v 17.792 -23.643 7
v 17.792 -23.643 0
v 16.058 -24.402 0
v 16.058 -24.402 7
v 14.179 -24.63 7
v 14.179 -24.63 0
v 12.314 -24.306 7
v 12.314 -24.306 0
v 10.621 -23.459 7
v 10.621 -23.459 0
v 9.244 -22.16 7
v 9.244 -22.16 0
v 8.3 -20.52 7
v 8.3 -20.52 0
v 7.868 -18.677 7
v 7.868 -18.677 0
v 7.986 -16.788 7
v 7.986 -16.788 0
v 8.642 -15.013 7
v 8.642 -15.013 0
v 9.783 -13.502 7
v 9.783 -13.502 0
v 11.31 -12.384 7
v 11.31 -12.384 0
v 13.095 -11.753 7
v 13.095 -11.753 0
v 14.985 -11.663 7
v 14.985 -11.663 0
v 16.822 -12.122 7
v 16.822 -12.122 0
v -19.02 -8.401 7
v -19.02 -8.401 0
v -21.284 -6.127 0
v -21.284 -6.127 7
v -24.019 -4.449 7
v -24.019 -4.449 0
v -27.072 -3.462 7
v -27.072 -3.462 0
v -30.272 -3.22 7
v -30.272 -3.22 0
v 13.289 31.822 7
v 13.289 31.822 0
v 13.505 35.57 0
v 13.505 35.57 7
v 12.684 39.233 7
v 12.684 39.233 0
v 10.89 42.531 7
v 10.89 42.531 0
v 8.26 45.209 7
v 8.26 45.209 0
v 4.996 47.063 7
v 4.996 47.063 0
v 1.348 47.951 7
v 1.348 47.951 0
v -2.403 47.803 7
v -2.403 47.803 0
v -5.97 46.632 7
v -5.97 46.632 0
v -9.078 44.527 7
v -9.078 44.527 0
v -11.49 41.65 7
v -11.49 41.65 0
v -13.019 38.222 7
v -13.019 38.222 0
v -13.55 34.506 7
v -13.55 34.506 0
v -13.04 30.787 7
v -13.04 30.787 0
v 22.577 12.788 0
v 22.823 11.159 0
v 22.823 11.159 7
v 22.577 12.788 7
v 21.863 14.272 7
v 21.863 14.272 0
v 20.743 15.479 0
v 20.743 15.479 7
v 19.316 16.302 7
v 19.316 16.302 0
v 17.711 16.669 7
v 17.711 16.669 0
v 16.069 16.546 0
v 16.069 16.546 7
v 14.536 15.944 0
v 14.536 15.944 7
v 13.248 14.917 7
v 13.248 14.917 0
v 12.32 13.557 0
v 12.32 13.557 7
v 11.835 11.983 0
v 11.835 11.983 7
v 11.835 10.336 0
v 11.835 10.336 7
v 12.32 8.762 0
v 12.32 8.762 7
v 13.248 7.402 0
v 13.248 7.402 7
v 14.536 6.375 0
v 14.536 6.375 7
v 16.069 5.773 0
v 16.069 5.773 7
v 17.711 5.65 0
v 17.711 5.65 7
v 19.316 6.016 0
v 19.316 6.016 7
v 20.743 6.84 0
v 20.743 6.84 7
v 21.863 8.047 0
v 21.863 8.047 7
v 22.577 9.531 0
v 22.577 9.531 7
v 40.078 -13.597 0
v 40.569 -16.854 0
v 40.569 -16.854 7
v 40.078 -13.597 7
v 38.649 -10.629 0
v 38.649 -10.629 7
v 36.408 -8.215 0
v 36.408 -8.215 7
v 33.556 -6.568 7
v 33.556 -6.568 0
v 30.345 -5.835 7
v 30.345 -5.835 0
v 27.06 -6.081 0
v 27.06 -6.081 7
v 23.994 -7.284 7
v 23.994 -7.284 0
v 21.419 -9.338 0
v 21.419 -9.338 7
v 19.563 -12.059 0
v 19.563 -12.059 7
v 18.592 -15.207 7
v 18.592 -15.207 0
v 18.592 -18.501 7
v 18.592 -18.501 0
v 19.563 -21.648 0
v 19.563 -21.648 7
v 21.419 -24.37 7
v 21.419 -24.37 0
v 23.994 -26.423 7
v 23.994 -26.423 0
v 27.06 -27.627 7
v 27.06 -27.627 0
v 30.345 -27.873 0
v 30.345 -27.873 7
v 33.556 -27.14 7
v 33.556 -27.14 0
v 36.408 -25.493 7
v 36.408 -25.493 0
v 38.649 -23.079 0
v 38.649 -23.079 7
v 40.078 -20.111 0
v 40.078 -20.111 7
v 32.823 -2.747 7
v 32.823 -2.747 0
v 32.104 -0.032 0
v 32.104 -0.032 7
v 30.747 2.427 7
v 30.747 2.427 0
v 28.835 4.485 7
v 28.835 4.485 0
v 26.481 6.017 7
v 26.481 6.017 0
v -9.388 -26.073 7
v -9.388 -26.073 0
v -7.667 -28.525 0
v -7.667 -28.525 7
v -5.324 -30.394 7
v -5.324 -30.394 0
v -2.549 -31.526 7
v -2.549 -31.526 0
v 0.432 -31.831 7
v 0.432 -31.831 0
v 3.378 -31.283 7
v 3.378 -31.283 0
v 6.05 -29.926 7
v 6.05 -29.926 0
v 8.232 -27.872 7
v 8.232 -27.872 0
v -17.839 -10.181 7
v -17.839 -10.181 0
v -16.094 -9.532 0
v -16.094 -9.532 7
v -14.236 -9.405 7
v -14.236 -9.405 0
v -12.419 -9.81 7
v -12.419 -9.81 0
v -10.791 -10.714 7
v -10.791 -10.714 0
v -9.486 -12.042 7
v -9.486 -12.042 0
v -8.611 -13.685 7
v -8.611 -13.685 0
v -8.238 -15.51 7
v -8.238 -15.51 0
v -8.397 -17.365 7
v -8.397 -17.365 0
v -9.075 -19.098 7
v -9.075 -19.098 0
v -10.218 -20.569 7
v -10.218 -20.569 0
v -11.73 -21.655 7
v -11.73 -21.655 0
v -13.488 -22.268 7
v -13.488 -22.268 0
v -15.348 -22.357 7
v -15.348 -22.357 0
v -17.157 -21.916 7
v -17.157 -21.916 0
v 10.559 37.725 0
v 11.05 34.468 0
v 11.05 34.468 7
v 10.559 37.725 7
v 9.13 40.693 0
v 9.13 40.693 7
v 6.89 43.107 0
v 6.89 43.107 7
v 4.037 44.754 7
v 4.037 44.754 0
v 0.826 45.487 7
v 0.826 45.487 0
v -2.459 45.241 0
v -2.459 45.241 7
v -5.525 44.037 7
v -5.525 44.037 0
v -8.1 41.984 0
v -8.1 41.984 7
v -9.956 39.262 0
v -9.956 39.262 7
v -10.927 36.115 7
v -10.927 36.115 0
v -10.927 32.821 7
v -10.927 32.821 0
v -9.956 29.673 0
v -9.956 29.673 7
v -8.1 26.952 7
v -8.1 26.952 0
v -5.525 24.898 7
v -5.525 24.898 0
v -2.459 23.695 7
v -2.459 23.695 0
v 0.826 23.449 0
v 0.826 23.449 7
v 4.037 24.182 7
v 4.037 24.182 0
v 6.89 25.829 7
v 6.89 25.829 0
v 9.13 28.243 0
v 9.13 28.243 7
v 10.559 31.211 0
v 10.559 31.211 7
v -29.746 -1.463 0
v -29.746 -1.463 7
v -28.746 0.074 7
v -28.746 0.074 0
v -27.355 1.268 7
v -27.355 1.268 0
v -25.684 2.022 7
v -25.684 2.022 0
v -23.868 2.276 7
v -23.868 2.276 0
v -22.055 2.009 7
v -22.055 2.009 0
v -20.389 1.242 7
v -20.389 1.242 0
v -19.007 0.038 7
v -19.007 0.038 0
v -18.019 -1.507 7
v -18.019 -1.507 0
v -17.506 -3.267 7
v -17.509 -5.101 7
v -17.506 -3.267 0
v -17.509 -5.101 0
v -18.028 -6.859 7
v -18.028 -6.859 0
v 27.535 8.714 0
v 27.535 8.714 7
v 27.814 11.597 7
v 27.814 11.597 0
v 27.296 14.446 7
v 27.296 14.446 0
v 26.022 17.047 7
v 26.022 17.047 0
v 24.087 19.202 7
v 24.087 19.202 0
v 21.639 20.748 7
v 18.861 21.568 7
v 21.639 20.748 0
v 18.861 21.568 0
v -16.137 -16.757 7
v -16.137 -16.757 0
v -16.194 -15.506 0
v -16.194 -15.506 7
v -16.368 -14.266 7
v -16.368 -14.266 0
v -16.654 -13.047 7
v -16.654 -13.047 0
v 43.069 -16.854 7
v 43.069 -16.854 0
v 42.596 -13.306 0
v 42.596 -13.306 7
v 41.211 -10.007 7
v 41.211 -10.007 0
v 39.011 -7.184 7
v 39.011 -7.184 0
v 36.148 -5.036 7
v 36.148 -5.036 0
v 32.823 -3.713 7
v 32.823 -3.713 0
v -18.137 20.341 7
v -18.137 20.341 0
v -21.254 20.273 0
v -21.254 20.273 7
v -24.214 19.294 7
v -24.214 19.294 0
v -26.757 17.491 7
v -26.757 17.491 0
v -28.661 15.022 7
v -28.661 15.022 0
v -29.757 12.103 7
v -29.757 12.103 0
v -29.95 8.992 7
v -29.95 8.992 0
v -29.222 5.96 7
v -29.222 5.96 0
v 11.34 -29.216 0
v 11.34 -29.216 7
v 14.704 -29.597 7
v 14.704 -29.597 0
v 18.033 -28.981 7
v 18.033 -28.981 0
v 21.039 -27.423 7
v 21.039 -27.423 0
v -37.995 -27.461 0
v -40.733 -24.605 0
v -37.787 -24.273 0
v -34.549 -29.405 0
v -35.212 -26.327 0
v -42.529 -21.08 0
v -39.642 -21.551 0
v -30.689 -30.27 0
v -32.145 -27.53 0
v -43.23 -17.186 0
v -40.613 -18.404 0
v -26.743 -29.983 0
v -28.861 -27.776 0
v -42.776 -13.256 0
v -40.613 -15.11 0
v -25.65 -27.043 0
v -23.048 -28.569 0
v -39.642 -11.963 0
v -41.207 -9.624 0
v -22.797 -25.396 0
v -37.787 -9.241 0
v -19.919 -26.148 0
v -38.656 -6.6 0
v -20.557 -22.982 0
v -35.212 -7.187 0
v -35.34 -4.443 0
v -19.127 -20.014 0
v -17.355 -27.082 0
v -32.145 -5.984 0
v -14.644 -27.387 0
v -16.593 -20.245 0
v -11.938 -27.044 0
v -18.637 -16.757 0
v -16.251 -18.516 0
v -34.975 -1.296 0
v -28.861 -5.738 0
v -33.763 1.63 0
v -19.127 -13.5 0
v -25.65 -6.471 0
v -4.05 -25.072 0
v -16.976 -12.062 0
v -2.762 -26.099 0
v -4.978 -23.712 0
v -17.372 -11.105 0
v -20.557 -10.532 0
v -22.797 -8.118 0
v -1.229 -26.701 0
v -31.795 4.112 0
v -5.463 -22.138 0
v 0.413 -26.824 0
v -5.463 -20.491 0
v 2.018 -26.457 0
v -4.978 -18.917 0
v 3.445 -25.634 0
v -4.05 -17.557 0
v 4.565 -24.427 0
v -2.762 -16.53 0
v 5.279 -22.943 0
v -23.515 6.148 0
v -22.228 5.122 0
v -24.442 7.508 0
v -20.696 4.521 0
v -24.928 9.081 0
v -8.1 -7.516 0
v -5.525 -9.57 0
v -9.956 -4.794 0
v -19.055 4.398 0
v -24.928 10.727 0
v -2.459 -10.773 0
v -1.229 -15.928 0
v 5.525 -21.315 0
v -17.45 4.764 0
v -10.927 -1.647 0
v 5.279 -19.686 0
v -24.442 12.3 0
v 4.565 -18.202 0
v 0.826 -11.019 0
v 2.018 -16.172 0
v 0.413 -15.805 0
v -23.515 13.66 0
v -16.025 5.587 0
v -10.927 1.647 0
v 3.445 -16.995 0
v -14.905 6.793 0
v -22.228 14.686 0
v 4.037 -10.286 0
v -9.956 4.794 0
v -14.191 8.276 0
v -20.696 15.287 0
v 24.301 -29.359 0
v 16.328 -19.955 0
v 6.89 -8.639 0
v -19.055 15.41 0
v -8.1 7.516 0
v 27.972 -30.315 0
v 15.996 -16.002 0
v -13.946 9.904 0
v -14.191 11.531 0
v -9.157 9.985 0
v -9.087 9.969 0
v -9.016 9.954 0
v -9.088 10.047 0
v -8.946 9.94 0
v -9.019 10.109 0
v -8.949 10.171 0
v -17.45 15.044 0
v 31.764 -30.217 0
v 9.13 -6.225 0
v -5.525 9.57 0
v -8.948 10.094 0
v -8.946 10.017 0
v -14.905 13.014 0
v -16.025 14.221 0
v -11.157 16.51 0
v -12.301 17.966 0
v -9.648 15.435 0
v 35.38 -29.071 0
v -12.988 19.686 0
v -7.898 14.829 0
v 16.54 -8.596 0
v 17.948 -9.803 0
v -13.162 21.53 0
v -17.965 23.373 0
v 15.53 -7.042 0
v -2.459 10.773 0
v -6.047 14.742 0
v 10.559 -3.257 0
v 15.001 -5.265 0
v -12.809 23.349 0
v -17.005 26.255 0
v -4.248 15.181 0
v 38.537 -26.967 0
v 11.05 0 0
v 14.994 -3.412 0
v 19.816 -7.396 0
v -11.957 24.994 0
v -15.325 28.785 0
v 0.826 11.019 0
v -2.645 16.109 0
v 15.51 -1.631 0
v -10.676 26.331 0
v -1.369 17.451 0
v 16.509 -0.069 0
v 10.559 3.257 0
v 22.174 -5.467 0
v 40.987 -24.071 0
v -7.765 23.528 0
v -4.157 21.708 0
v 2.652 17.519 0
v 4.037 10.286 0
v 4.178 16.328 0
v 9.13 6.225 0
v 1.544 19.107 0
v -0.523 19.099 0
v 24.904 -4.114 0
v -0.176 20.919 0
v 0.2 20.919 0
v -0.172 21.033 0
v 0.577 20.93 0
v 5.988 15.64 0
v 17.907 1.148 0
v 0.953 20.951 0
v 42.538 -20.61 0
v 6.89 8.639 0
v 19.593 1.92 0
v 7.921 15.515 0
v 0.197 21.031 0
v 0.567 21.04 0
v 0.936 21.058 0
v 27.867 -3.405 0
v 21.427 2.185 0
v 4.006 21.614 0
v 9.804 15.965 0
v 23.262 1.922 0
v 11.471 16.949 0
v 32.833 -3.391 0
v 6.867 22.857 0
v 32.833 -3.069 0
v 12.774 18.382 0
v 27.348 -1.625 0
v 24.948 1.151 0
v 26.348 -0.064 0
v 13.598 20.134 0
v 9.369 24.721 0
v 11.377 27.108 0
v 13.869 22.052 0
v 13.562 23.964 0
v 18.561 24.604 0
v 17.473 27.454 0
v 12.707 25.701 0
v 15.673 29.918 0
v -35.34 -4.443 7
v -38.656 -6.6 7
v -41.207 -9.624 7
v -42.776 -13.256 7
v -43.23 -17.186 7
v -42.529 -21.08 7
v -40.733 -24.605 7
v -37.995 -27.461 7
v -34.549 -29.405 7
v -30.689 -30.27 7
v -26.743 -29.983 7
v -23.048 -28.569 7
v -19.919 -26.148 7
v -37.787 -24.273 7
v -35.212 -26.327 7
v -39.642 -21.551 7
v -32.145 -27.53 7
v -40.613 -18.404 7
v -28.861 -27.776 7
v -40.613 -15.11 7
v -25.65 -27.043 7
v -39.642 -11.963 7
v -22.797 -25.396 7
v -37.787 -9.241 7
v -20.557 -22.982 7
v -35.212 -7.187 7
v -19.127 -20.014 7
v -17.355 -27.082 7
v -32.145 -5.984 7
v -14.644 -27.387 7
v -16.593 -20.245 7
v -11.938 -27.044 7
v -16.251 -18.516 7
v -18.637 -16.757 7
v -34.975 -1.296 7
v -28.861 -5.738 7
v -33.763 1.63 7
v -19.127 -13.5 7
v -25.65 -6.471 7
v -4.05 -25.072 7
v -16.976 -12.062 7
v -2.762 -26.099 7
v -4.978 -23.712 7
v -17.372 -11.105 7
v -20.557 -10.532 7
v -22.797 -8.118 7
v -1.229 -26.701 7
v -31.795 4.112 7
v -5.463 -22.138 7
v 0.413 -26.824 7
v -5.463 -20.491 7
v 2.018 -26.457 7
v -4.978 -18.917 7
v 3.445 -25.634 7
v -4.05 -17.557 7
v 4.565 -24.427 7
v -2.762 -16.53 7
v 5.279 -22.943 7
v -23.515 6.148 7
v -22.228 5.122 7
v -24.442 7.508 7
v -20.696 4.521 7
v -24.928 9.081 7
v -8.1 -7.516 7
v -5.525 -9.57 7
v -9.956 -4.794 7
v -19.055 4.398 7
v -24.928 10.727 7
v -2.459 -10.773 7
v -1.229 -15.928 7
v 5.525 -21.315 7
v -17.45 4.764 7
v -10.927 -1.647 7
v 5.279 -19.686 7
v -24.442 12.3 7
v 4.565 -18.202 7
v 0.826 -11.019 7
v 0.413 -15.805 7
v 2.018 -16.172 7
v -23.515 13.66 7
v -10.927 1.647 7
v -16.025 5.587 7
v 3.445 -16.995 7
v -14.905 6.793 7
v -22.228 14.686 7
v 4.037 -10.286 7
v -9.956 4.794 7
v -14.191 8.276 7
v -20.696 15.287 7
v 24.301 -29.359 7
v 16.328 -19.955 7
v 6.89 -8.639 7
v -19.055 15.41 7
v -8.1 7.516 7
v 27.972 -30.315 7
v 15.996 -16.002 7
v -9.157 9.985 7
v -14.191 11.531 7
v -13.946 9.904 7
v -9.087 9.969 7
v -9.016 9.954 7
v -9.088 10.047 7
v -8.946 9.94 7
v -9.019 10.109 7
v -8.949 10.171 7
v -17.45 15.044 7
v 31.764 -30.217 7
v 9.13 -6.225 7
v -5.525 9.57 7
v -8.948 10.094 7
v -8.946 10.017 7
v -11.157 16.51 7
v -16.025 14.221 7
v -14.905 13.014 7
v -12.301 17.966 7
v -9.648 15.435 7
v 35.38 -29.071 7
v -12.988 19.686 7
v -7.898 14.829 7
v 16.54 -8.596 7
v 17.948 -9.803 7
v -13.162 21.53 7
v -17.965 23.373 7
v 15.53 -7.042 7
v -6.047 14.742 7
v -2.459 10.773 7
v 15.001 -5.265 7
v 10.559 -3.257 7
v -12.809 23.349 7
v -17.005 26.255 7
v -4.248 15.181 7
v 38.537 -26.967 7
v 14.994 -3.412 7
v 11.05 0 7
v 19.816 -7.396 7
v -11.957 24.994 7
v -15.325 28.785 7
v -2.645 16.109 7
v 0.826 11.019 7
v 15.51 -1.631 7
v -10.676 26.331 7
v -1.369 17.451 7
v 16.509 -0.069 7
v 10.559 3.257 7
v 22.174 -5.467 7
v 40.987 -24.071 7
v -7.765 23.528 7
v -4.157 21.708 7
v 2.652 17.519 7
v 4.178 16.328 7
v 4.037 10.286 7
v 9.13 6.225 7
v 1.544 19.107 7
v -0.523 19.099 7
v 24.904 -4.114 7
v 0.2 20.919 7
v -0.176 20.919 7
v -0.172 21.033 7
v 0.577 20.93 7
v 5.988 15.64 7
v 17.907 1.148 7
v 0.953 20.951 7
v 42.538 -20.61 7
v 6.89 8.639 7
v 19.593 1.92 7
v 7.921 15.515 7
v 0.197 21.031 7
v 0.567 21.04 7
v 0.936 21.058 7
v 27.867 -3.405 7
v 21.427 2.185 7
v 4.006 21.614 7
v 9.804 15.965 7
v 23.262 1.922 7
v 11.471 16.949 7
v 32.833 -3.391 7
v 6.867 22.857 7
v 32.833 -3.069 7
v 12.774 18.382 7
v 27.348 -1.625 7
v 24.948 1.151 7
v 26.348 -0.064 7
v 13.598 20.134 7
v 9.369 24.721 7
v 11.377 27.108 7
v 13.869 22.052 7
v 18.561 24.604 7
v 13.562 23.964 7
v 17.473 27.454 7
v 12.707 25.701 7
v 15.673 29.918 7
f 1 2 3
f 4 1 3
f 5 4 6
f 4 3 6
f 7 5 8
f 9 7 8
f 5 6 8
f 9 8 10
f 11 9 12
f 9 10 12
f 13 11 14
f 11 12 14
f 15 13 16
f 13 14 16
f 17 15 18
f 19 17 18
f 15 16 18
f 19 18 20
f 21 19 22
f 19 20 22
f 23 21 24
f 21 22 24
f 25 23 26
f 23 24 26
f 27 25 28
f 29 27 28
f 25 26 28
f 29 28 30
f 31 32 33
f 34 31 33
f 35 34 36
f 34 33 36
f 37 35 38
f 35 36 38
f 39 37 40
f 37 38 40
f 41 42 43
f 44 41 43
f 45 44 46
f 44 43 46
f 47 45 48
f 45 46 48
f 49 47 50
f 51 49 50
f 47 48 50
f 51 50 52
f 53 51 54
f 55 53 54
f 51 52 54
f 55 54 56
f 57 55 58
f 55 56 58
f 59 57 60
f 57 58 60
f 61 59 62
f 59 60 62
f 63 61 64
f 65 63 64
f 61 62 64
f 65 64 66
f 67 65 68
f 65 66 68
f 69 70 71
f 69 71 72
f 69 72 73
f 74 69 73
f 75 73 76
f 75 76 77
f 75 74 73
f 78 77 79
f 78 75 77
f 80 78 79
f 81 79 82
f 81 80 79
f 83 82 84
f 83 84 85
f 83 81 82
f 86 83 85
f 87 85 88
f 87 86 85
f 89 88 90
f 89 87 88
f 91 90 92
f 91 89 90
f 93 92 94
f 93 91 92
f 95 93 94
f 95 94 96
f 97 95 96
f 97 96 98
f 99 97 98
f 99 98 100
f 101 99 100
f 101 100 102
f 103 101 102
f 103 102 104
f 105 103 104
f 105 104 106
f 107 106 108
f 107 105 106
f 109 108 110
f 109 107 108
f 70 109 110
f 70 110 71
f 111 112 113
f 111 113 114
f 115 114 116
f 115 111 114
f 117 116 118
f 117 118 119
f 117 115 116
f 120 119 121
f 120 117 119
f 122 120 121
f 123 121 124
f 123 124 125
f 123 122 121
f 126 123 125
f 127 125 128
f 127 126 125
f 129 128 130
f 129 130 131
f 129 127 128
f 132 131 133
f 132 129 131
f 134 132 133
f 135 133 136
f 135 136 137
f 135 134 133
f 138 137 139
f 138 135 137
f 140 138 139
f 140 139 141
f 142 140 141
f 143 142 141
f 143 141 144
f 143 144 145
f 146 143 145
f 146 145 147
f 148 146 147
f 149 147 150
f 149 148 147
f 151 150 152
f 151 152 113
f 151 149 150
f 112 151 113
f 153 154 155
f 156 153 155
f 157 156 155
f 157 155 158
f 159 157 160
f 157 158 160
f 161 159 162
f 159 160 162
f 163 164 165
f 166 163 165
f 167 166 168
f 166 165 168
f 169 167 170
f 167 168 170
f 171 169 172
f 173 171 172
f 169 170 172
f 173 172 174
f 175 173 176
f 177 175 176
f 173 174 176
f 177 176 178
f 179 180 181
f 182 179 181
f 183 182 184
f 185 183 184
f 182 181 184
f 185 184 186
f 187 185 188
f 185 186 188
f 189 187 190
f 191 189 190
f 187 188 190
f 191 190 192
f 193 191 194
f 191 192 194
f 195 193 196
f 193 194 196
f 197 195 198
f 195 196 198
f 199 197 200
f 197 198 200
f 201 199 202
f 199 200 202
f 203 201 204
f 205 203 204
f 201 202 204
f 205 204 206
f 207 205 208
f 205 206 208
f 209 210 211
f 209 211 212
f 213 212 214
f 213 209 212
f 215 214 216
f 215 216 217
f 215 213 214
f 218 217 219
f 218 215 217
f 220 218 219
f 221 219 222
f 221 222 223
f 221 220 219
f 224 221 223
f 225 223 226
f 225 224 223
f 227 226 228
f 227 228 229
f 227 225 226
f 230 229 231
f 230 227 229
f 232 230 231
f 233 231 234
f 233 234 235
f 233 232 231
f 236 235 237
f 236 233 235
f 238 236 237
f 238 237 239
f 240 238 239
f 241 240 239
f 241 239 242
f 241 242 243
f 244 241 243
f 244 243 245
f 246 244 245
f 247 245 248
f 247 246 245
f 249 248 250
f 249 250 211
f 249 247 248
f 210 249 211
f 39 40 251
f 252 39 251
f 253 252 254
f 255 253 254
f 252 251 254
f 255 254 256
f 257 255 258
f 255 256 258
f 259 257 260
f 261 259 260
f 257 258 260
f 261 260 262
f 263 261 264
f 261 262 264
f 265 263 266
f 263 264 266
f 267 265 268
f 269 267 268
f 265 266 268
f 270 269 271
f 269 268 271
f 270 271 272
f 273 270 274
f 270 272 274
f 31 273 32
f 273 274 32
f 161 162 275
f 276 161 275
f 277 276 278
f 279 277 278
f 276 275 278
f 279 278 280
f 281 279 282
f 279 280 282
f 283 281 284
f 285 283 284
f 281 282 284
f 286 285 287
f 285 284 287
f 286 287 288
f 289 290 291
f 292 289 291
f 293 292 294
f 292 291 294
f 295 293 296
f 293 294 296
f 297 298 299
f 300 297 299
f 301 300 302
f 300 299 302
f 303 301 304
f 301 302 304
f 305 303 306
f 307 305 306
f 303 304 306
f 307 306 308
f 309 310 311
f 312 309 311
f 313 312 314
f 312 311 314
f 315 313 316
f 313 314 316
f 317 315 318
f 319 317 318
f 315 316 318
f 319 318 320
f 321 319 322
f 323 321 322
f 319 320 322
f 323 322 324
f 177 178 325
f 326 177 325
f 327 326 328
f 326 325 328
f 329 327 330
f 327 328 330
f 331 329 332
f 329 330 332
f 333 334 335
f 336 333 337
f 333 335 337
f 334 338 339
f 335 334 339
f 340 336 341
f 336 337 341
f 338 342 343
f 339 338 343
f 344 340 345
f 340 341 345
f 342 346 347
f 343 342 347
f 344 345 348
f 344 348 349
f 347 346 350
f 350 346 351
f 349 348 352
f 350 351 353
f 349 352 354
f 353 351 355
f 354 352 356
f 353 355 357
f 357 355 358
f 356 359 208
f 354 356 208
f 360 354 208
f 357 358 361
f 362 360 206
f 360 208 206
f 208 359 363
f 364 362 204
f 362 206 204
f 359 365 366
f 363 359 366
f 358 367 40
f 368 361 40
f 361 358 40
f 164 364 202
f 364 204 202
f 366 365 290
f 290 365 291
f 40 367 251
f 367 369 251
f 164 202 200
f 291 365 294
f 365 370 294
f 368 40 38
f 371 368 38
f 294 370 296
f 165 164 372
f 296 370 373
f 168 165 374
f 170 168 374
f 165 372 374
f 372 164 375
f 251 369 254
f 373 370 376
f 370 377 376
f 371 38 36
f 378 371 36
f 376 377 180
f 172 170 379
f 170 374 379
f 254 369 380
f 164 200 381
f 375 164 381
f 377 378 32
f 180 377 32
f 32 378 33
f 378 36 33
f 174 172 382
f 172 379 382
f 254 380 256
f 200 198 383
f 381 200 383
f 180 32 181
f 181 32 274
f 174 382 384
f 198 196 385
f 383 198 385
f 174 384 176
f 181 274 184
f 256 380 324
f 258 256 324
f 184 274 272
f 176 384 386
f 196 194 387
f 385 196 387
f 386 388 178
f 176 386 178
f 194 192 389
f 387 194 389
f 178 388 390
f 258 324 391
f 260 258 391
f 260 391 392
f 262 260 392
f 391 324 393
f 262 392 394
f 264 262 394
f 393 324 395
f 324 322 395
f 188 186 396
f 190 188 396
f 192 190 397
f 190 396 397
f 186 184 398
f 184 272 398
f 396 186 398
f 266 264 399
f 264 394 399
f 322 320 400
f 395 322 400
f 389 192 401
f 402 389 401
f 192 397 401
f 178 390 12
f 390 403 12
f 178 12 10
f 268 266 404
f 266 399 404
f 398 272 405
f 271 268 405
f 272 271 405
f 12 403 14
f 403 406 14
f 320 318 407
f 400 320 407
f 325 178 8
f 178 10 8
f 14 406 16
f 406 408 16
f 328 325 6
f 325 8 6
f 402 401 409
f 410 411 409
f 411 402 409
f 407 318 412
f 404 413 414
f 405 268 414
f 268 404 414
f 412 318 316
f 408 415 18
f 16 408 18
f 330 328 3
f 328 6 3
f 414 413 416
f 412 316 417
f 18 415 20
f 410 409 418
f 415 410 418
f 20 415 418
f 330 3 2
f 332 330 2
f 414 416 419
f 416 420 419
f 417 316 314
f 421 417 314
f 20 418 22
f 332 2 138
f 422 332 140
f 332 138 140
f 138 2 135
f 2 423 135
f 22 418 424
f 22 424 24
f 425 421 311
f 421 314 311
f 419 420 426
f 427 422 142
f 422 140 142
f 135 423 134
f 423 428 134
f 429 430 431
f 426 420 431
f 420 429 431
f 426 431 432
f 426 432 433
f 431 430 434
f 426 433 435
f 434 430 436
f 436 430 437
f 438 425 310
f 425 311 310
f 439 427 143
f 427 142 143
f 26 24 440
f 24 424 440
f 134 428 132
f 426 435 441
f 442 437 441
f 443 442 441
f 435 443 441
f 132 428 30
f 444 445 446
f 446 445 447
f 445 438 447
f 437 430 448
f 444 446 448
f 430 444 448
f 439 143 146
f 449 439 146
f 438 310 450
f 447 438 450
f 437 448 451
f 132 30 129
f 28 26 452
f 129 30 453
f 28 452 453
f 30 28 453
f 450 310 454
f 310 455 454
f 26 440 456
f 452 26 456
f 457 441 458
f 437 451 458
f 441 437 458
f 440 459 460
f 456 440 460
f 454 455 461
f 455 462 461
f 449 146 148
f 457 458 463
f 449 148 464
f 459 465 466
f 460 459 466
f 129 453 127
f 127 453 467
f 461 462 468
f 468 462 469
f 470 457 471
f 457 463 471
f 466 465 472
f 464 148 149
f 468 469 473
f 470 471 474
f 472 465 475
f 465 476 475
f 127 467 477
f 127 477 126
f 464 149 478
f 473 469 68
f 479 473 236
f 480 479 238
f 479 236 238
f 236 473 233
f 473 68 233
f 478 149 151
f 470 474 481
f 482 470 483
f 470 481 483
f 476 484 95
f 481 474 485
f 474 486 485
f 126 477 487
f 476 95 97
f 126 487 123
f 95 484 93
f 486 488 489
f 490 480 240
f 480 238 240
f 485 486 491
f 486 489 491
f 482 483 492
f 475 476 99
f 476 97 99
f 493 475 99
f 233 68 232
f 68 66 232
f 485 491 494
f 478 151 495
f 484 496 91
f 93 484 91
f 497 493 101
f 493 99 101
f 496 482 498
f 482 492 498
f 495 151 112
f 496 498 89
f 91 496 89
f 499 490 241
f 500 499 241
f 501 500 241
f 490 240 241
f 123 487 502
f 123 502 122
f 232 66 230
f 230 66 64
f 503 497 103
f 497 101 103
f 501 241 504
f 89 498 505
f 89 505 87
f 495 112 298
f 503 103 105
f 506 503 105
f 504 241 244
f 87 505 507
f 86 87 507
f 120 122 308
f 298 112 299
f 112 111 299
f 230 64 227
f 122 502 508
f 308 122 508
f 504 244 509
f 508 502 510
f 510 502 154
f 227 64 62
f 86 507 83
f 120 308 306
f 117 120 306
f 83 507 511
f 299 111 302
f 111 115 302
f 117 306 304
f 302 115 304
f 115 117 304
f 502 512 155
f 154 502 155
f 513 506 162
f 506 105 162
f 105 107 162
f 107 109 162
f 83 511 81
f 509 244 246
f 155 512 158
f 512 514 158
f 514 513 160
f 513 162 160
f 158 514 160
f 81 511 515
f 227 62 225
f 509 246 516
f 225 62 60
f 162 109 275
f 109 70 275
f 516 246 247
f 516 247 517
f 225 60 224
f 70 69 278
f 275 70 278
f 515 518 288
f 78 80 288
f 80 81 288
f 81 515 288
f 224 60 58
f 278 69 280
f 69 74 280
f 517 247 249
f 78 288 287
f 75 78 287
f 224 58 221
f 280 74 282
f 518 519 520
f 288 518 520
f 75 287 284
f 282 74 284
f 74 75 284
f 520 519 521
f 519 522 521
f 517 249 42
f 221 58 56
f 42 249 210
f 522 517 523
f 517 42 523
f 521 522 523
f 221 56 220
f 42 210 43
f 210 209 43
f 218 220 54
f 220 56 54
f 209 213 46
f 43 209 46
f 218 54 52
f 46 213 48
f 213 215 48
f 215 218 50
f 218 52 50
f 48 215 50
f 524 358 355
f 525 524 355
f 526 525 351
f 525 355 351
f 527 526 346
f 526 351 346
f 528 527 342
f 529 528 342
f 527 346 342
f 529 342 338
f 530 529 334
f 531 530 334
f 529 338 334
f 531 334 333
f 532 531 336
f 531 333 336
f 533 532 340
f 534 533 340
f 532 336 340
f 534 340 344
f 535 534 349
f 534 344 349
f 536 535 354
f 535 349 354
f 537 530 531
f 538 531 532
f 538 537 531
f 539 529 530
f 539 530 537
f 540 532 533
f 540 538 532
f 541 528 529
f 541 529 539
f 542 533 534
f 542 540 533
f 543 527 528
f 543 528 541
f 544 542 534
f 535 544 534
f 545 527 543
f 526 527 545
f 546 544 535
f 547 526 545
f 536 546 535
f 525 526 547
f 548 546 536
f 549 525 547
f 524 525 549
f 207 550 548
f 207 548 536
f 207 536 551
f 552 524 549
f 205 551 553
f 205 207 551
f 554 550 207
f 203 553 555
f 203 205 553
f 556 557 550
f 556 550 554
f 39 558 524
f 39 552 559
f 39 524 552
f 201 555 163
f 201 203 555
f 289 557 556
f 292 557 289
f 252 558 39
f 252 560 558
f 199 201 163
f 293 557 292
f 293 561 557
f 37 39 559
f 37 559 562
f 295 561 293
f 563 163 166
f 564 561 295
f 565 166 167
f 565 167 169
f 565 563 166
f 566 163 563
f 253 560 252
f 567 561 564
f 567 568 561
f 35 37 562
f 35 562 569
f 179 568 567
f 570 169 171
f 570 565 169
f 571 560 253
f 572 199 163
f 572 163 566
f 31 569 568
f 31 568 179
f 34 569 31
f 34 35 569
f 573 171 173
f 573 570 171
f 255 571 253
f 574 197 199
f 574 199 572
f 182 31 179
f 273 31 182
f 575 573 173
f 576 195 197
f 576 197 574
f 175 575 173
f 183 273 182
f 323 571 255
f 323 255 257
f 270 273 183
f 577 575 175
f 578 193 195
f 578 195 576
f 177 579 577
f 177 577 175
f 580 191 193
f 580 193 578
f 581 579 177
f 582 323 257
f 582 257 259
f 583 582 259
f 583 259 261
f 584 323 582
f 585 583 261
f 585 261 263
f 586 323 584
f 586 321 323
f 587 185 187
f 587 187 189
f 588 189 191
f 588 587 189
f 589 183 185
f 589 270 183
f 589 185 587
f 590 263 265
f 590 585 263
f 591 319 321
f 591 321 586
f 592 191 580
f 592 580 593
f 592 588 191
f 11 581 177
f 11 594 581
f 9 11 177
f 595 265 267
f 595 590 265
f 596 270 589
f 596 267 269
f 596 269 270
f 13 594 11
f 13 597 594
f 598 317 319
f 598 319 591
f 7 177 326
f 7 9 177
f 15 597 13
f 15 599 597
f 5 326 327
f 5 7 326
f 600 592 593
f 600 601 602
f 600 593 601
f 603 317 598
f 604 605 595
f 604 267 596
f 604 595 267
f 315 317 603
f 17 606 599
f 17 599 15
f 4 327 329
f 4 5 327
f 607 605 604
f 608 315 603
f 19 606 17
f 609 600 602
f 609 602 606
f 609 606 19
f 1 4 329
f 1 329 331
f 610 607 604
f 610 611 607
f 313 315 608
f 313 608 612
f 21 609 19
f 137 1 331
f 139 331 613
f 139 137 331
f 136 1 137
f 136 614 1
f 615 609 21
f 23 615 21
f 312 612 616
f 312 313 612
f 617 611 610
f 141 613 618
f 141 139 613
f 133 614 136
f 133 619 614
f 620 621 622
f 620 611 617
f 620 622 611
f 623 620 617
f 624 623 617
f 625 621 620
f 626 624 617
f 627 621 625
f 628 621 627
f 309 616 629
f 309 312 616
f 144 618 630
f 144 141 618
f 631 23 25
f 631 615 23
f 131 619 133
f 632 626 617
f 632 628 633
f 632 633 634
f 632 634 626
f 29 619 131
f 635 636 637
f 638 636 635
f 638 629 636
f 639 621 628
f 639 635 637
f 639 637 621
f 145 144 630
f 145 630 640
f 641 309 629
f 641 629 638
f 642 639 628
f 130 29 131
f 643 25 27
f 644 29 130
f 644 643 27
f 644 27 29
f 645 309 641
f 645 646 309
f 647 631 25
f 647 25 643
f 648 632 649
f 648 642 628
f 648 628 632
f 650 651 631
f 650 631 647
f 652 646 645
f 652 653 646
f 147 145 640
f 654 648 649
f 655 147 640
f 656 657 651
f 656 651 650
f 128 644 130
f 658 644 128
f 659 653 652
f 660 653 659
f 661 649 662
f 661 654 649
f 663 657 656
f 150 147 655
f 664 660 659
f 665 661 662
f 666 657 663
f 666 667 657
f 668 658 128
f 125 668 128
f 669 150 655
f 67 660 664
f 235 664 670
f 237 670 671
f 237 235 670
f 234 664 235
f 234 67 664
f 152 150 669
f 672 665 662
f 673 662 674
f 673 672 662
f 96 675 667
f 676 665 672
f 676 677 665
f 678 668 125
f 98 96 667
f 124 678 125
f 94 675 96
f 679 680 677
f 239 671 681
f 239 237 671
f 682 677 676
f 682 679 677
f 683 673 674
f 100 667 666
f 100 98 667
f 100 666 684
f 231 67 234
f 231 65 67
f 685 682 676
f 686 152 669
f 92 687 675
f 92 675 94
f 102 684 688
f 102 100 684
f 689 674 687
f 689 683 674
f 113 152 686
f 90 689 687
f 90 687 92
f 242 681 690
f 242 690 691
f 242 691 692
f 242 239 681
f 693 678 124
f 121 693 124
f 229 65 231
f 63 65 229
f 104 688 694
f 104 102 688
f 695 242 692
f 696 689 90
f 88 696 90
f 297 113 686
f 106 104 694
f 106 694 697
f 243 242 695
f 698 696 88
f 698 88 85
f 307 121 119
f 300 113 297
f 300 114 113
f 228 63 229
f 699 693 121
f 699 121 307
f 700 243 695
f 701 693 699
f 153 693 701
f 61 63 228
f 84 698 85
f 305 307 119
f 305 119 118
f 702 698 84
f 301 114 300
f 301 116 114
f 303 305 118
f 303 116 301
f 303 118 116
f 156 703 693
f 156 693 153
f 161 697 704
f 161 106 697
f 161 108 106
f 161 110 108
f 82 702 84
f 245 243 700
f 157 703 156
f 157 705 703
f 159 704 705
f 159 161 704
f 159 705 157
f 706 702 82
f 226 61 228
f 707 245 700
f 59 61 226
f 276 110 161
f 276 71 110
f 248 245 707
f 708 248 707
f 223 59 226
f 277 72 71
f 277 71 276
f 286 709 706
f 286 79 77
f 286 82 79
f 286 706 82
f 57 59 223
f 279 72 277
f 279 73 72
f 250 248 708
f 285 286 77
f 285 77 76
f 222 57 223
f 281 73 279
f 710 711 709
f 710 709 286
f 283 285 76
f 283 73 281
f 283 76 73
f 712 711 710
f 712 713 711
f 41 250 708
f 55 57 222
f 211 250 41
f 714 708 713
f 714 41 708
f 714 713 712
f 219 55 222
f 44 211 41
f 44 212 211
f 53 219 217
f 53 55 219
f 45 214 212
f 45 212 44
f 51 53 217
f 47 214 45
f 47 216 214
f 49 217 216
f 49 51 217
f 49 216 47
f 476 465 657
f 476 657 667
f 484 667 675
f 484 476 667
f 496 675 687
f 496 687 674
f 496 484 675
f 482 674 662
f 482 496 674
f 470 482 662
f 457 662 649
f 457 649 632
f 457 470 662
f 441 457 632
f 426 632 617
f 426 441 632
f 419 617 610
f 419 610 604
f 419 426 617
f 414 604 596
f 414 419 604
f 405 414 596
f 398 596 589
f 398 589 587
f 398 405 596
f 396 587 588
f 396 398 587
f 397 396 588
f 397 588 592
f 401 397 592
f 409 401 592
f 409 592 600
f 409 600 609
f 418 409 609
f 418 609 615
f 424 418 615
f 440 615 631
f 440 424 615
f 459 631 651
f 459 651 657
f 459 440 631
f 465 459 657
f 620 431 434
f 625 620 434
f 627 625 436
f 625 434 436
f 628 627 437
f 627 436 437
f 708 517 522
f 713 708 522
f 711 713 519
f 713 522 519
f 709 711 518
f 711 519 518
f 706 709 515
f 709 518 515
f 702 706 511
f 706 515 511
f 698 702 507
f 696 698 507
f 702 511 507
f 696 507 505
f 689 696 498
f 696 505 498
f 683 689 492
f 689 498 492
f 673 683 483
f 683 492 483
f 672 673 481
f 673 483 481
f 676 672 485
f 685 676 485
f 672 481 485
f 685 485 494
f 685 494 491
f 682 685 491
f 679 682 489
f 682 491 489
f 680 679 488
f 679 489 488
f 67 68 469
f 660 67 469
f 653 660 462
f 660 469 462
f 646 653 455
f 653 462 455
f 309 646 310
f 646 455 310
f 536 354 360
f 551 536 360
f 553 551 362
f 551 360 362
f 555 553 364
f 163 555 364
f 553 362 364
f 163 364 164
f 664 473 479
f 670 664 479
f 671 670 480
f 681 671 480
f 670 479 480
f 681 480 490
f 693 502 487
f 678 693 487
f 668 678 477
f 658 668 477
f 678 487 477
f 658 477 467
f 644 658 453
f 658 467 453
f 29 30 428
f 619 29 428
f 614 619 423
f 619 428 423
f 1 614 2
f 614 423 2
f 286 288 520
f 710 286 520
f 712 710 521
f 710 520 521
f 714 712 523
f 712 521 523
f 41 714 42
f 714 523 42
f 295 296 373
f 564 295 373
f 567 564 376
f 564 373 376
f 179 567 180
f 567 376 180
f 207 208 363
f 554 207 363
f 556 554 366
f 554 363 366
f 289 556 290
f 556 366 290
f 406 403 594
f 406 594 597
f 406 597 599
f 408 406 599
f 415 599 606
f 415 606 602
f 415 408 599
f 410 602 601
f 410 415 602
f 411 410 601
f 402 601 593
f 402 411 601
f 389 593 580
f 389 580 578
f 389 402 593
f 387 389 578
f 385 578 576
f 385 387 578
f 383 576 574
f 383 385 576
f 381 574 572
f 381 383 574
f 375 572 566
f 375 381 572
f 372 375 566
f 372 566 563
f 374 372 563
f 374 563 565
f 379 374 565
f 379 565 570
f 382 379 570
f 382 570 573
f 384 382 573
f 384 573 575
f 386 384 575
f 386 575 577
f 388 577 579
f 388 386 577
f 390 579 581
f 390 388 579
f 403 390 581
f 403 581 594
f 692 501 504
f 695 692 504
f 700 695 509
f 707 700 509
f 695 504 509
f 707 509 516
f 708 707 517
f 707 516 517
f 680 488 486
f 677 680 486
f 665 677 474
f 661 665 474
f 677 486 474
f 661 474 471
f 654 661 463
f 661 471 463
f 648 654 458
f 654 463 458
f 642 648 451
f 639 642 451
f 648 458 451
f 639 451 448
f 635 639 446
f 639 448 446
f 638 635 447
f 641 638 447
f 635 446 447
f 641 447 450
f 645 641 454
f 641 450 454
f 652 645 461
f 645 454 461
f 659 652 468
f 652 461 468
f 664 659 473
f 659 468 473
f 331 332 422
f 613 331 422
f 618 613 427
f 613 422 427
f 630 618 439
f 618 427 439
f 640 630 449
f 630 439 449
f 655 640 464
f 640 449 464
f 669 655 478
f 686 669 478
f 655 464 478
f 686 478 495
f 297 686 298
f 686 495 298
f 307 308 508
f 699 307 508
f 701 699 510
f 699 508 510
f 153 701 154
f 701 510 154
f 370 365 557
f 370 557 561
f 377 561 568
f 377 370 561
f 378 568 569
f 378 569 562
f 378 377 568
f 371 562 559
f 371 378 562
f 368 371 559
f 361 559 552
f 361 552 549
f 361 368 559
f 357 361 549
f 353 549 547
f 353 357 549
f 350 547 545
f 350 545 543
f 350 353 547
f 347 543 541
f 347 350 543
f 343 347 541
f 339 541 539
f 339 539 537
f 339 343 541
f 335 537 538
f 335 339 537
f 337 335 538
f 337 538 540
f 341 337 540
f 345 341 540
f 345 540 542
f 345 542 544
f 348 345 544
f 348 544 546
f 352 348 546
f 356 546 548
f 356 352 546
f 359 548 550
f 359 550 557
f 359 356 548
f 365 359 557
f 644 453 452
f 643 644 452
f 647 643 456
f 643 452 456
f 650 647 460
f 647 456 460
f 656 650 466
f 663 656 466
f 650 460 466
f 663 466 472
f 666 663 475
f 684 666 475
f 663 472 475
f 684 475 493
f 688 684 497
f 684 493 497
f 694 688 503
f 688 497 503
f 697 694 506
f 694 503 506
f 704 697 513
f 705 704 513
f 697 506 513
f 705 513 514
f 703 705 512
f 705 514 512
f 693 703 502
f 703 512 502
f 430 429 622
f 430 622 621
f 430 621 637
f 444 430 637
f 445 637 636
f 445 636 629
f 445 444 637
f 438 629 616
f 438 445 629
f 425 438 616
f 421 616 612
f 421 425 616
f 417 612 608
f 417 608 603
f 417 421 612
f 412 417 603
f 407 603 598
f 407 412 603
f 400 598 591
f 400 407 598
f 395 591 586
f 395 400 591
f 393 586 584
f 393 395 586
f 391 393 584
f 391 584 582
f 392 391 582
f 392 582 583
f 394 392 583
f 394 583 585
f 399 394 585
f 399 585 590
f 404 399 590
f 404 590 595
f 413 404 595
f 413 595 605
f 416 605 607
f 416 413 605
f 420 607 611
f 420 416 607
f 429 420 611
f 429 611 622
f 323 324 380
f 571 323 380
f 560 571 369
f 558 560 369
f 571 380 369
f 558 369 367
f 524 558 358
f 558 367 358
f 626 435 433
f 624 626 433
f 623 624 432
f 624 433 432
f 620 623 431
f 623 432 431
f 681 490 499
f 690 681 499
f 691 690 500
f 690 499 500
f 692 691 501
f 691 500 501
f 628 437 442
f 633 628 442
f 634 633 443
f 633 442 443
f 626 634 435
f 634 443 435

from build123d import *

# Parameters (mm, degrees)
F0_R     = 11.05
F0_R_2   = 5.524841
F0_R_3   = 5.521717
F1_DEPTH = 7


with BuildPart() as f1:
    # F0 (on Top) → F1 (new body)
    with BuildSketch(Plane.XY):
        with BuildLine():
            ThreePointArc((-30.27175, -3.219667), (-32.865041, -3.5851), (-35.339594, -4.442586))
            ThreePointArc((-35.339594, -4.442586), (-40.732584, -24.604776), (-19.918734, -26.148118))
            ThreePointArc((-19.918734, -26.148118), (-18.338716, -24.161725), (-17.156869, -21.915518))
            ThreePointArc((-17.156869, -21.915518), (-16.394062, -19.386242), (-16.136531, -16.757023))
            ThreePointArc((-16.136531, -16.757023), (-16.266635, -14.883817), (-16.65445, -13.046583))
            ThreePointArc((-16.65445, -13.046583), (-17.164663, -11.579637), (-17.839394, -10.180713))
            ThreePointArc((-17.839394, -10.180713), (-18.394537, -9.267472), (-19.019928, -8.400823))
            ThreePointArc((-19.019928, -8.400823), (-24.019109, -4.449187), (-30.27175, -3.219667))
        make_face()
        with Locations((-29.686531, -16.757023)):
            Circle(F0_R, mode=Mode.SUBTRACT)
        with BuildLine():
            ThreePointArc((-13.040381, 30.786681), (-12.067165, 28.448015), (-10.675671, 26.331354))
            ThreePointArc((-10.675671, 26.331354), (-6.029005, 22.482823), (-0.172342, 21.032925))
            ThreePointArc((-0.172342, 21.032925), (0.382199, 21.034199), (0.936224, 21.058163))
            ThreePointArc((0.936224, 21.058163), (6.867395, 22.856804), (11.377187, 27.108354))
            ThreePointArc((11.377187, 27.108354), (12.556434, 29.374864), (13.289258, 31.822448))
            ThreePointArc((13.289258, 31.822448), (-0.532624, 48.007374), (-13.040381, 30.786681))
        make_face()
        with Locations((0, 34.467846)):
            Circle(F0_R, mode=Mode.SUBTRACT)
        with BuildLine():
            ThreePointArc((0.952624, 20.951374), (0.388404, 20.923414), (-0.17649, 20.918996))
            ThreePointArc((-0.17649, 20.918996), (-9.648186, 15.43491), (-10.675671, 26.331354))
            ThreePointArc((-10.675671, 26.331354), (-12.067165, 28.448015), (-13.040381, 30.786681))
            ThreePointArc((-13.040381, 30.786681), (-17.005323, 26.255064), (-18.1368, 20.341006))
            ThreePointArc((-18.1368, 20.341006), (-27.800797, 16.327475), (-29.222287, 5.960189))
            ThreePointArc((-29.222287, 5.960189), (-33.762662, 1.630121), (-35.339594, -4.442586))
            ThreePointArc((-35.339594, -4.442586), (-32.865041, -3.5851), (-30.27175, -3.219667))
            ThreePointArc((-30.27175, -3.219667), (-21.194494, 1.684977), (-19.019928, -8.400823))
            ThreePointArc((-19.019928, -8.400823), (-18.394537, -9.267472), (-17.839394, -10.180713))
            ThreePointArc((-17.839394, -10.180713), (-8.23761, -15.509501), (-17.156869, -21.915518))
            ThreePointArc((-17.156869, -21.915518), (-18.338716, -24.161725), (-19.918734, -26.148118))
            ThreePointArc((-19.918734, -26.148118), (-14.644184, -27.386623), (-9.387936, -26.072605))
            ThreePointArc((-9.387936, -26.072605), (-1.069433, -31.784934), (8.232154, -27.872304))
            ThreePointArc((8.232154, -27.872304), (14.704134, -29.596756), (21.039259, -27.422716))
            ThreePointArc((21.039259, -27.422716), (19.240377, -25.683208), (17.792045, -23.642571))
            ThreePointArc((17.792045, -23.642571), (7.868212, -18.677143), (16.821859, -12.12198))
            ThreePointArc((16.821859, -12.12198), (17.329602, -10.93555), (17.947911, -9.802803))
            ThreePointArc((17.947911, -9.802803), (17.907438, 1.147655), (27.866747, -3.404964))
            ThreePointArc((27.866747, -3.404964), (30.35929, -3.329972), (32.823366, -3.71302))
            ThreePointArc((32.823366, -3.71302), (32.834455, -3.230002), (32.823366, -2.746983))
            ThreePointArc((32.823366, -2.746983), (30.747102, 2.4274), (26.48104, 6.017083))
            ThreePointArc((26.48104, 6.017083), (26.74913, 15.790636), (18.861073, 21.567552))
            ThreePointArc((18.861073, 21.567552), (17.472712, 27.454332), (13.289258, 31.822448))
            ThreePointArc((13.289258, 31.822448), (12.556434, 29.374864), (11.377187, 27.108354))
            ThreePointArc((11.377187, 27.108354), (10.674436, 16.394645), (0.952624, 20.951374))
        make_face()
        with Locations((0, -21.314567)):
            Circle(F0_R_2, mode=Mode.SUBTRACT)
        Circle(F0_R, mode=Mode.SUBTRACT)
        with Locations((-19.467567, 9.903785)):
            Circle(F0_R_3, mode=Mode.SUBTRACT)
        with BuildLine():
            ThreePointArc((-9.156847, 9.984555), (-9.053526, 10.078335), (-8.949245, 10.171047))
            ThreePointArc((-8.949245, 10.171047), (-8.946944, 10.055484), (-8.945912, 9.939903))
            ThreePointArc((-8.945912, 9.939903), (-9.051484, 9.961735), (-9.156847, 9.984555))
        make_face(mode=Mode.SUBTRACT)
        with Locations((17.297982, 11.159429)):
            Circle(F0_R_2, mode=Mode.SUBTRACT)
        with BuildLine():
            ThreePointArc((43.068773, -16.853878), (40.204739, -8.522454), (32.823366, -3.71302))
            ThreePointArc((32.823366, -3.71302), (30.35929, -3.329972), (27.866747, -3.404964))
            ThreePointArc((27.866747, -3.404964), (22.174096, -5.467122), (17.947911, -9.802803))
            ThreePointArc((17.947911, -9.802803), (17.329602, -10.93555), (16.821859, -12.12198))
            ThreePointArc((16.821859, -12.12198), (16.016566, -17.990943), (17.792045, -23.642571))
            ThreePointArc((17.792045, -23.642571), (19.240377, -25.683208), (21.039259, -27.422716))
            ThreePointArc((21.039259, -27.422716), (35.379877, -29.070669), (43.068773, -16.853878))
        make_face()
        with Locations((29.518773, -16.853878)):
            Circle(F0_R, mode=Mode.SUBTRACT)
    extrude(amount=F1_DEPTH)


solid = f1.part
